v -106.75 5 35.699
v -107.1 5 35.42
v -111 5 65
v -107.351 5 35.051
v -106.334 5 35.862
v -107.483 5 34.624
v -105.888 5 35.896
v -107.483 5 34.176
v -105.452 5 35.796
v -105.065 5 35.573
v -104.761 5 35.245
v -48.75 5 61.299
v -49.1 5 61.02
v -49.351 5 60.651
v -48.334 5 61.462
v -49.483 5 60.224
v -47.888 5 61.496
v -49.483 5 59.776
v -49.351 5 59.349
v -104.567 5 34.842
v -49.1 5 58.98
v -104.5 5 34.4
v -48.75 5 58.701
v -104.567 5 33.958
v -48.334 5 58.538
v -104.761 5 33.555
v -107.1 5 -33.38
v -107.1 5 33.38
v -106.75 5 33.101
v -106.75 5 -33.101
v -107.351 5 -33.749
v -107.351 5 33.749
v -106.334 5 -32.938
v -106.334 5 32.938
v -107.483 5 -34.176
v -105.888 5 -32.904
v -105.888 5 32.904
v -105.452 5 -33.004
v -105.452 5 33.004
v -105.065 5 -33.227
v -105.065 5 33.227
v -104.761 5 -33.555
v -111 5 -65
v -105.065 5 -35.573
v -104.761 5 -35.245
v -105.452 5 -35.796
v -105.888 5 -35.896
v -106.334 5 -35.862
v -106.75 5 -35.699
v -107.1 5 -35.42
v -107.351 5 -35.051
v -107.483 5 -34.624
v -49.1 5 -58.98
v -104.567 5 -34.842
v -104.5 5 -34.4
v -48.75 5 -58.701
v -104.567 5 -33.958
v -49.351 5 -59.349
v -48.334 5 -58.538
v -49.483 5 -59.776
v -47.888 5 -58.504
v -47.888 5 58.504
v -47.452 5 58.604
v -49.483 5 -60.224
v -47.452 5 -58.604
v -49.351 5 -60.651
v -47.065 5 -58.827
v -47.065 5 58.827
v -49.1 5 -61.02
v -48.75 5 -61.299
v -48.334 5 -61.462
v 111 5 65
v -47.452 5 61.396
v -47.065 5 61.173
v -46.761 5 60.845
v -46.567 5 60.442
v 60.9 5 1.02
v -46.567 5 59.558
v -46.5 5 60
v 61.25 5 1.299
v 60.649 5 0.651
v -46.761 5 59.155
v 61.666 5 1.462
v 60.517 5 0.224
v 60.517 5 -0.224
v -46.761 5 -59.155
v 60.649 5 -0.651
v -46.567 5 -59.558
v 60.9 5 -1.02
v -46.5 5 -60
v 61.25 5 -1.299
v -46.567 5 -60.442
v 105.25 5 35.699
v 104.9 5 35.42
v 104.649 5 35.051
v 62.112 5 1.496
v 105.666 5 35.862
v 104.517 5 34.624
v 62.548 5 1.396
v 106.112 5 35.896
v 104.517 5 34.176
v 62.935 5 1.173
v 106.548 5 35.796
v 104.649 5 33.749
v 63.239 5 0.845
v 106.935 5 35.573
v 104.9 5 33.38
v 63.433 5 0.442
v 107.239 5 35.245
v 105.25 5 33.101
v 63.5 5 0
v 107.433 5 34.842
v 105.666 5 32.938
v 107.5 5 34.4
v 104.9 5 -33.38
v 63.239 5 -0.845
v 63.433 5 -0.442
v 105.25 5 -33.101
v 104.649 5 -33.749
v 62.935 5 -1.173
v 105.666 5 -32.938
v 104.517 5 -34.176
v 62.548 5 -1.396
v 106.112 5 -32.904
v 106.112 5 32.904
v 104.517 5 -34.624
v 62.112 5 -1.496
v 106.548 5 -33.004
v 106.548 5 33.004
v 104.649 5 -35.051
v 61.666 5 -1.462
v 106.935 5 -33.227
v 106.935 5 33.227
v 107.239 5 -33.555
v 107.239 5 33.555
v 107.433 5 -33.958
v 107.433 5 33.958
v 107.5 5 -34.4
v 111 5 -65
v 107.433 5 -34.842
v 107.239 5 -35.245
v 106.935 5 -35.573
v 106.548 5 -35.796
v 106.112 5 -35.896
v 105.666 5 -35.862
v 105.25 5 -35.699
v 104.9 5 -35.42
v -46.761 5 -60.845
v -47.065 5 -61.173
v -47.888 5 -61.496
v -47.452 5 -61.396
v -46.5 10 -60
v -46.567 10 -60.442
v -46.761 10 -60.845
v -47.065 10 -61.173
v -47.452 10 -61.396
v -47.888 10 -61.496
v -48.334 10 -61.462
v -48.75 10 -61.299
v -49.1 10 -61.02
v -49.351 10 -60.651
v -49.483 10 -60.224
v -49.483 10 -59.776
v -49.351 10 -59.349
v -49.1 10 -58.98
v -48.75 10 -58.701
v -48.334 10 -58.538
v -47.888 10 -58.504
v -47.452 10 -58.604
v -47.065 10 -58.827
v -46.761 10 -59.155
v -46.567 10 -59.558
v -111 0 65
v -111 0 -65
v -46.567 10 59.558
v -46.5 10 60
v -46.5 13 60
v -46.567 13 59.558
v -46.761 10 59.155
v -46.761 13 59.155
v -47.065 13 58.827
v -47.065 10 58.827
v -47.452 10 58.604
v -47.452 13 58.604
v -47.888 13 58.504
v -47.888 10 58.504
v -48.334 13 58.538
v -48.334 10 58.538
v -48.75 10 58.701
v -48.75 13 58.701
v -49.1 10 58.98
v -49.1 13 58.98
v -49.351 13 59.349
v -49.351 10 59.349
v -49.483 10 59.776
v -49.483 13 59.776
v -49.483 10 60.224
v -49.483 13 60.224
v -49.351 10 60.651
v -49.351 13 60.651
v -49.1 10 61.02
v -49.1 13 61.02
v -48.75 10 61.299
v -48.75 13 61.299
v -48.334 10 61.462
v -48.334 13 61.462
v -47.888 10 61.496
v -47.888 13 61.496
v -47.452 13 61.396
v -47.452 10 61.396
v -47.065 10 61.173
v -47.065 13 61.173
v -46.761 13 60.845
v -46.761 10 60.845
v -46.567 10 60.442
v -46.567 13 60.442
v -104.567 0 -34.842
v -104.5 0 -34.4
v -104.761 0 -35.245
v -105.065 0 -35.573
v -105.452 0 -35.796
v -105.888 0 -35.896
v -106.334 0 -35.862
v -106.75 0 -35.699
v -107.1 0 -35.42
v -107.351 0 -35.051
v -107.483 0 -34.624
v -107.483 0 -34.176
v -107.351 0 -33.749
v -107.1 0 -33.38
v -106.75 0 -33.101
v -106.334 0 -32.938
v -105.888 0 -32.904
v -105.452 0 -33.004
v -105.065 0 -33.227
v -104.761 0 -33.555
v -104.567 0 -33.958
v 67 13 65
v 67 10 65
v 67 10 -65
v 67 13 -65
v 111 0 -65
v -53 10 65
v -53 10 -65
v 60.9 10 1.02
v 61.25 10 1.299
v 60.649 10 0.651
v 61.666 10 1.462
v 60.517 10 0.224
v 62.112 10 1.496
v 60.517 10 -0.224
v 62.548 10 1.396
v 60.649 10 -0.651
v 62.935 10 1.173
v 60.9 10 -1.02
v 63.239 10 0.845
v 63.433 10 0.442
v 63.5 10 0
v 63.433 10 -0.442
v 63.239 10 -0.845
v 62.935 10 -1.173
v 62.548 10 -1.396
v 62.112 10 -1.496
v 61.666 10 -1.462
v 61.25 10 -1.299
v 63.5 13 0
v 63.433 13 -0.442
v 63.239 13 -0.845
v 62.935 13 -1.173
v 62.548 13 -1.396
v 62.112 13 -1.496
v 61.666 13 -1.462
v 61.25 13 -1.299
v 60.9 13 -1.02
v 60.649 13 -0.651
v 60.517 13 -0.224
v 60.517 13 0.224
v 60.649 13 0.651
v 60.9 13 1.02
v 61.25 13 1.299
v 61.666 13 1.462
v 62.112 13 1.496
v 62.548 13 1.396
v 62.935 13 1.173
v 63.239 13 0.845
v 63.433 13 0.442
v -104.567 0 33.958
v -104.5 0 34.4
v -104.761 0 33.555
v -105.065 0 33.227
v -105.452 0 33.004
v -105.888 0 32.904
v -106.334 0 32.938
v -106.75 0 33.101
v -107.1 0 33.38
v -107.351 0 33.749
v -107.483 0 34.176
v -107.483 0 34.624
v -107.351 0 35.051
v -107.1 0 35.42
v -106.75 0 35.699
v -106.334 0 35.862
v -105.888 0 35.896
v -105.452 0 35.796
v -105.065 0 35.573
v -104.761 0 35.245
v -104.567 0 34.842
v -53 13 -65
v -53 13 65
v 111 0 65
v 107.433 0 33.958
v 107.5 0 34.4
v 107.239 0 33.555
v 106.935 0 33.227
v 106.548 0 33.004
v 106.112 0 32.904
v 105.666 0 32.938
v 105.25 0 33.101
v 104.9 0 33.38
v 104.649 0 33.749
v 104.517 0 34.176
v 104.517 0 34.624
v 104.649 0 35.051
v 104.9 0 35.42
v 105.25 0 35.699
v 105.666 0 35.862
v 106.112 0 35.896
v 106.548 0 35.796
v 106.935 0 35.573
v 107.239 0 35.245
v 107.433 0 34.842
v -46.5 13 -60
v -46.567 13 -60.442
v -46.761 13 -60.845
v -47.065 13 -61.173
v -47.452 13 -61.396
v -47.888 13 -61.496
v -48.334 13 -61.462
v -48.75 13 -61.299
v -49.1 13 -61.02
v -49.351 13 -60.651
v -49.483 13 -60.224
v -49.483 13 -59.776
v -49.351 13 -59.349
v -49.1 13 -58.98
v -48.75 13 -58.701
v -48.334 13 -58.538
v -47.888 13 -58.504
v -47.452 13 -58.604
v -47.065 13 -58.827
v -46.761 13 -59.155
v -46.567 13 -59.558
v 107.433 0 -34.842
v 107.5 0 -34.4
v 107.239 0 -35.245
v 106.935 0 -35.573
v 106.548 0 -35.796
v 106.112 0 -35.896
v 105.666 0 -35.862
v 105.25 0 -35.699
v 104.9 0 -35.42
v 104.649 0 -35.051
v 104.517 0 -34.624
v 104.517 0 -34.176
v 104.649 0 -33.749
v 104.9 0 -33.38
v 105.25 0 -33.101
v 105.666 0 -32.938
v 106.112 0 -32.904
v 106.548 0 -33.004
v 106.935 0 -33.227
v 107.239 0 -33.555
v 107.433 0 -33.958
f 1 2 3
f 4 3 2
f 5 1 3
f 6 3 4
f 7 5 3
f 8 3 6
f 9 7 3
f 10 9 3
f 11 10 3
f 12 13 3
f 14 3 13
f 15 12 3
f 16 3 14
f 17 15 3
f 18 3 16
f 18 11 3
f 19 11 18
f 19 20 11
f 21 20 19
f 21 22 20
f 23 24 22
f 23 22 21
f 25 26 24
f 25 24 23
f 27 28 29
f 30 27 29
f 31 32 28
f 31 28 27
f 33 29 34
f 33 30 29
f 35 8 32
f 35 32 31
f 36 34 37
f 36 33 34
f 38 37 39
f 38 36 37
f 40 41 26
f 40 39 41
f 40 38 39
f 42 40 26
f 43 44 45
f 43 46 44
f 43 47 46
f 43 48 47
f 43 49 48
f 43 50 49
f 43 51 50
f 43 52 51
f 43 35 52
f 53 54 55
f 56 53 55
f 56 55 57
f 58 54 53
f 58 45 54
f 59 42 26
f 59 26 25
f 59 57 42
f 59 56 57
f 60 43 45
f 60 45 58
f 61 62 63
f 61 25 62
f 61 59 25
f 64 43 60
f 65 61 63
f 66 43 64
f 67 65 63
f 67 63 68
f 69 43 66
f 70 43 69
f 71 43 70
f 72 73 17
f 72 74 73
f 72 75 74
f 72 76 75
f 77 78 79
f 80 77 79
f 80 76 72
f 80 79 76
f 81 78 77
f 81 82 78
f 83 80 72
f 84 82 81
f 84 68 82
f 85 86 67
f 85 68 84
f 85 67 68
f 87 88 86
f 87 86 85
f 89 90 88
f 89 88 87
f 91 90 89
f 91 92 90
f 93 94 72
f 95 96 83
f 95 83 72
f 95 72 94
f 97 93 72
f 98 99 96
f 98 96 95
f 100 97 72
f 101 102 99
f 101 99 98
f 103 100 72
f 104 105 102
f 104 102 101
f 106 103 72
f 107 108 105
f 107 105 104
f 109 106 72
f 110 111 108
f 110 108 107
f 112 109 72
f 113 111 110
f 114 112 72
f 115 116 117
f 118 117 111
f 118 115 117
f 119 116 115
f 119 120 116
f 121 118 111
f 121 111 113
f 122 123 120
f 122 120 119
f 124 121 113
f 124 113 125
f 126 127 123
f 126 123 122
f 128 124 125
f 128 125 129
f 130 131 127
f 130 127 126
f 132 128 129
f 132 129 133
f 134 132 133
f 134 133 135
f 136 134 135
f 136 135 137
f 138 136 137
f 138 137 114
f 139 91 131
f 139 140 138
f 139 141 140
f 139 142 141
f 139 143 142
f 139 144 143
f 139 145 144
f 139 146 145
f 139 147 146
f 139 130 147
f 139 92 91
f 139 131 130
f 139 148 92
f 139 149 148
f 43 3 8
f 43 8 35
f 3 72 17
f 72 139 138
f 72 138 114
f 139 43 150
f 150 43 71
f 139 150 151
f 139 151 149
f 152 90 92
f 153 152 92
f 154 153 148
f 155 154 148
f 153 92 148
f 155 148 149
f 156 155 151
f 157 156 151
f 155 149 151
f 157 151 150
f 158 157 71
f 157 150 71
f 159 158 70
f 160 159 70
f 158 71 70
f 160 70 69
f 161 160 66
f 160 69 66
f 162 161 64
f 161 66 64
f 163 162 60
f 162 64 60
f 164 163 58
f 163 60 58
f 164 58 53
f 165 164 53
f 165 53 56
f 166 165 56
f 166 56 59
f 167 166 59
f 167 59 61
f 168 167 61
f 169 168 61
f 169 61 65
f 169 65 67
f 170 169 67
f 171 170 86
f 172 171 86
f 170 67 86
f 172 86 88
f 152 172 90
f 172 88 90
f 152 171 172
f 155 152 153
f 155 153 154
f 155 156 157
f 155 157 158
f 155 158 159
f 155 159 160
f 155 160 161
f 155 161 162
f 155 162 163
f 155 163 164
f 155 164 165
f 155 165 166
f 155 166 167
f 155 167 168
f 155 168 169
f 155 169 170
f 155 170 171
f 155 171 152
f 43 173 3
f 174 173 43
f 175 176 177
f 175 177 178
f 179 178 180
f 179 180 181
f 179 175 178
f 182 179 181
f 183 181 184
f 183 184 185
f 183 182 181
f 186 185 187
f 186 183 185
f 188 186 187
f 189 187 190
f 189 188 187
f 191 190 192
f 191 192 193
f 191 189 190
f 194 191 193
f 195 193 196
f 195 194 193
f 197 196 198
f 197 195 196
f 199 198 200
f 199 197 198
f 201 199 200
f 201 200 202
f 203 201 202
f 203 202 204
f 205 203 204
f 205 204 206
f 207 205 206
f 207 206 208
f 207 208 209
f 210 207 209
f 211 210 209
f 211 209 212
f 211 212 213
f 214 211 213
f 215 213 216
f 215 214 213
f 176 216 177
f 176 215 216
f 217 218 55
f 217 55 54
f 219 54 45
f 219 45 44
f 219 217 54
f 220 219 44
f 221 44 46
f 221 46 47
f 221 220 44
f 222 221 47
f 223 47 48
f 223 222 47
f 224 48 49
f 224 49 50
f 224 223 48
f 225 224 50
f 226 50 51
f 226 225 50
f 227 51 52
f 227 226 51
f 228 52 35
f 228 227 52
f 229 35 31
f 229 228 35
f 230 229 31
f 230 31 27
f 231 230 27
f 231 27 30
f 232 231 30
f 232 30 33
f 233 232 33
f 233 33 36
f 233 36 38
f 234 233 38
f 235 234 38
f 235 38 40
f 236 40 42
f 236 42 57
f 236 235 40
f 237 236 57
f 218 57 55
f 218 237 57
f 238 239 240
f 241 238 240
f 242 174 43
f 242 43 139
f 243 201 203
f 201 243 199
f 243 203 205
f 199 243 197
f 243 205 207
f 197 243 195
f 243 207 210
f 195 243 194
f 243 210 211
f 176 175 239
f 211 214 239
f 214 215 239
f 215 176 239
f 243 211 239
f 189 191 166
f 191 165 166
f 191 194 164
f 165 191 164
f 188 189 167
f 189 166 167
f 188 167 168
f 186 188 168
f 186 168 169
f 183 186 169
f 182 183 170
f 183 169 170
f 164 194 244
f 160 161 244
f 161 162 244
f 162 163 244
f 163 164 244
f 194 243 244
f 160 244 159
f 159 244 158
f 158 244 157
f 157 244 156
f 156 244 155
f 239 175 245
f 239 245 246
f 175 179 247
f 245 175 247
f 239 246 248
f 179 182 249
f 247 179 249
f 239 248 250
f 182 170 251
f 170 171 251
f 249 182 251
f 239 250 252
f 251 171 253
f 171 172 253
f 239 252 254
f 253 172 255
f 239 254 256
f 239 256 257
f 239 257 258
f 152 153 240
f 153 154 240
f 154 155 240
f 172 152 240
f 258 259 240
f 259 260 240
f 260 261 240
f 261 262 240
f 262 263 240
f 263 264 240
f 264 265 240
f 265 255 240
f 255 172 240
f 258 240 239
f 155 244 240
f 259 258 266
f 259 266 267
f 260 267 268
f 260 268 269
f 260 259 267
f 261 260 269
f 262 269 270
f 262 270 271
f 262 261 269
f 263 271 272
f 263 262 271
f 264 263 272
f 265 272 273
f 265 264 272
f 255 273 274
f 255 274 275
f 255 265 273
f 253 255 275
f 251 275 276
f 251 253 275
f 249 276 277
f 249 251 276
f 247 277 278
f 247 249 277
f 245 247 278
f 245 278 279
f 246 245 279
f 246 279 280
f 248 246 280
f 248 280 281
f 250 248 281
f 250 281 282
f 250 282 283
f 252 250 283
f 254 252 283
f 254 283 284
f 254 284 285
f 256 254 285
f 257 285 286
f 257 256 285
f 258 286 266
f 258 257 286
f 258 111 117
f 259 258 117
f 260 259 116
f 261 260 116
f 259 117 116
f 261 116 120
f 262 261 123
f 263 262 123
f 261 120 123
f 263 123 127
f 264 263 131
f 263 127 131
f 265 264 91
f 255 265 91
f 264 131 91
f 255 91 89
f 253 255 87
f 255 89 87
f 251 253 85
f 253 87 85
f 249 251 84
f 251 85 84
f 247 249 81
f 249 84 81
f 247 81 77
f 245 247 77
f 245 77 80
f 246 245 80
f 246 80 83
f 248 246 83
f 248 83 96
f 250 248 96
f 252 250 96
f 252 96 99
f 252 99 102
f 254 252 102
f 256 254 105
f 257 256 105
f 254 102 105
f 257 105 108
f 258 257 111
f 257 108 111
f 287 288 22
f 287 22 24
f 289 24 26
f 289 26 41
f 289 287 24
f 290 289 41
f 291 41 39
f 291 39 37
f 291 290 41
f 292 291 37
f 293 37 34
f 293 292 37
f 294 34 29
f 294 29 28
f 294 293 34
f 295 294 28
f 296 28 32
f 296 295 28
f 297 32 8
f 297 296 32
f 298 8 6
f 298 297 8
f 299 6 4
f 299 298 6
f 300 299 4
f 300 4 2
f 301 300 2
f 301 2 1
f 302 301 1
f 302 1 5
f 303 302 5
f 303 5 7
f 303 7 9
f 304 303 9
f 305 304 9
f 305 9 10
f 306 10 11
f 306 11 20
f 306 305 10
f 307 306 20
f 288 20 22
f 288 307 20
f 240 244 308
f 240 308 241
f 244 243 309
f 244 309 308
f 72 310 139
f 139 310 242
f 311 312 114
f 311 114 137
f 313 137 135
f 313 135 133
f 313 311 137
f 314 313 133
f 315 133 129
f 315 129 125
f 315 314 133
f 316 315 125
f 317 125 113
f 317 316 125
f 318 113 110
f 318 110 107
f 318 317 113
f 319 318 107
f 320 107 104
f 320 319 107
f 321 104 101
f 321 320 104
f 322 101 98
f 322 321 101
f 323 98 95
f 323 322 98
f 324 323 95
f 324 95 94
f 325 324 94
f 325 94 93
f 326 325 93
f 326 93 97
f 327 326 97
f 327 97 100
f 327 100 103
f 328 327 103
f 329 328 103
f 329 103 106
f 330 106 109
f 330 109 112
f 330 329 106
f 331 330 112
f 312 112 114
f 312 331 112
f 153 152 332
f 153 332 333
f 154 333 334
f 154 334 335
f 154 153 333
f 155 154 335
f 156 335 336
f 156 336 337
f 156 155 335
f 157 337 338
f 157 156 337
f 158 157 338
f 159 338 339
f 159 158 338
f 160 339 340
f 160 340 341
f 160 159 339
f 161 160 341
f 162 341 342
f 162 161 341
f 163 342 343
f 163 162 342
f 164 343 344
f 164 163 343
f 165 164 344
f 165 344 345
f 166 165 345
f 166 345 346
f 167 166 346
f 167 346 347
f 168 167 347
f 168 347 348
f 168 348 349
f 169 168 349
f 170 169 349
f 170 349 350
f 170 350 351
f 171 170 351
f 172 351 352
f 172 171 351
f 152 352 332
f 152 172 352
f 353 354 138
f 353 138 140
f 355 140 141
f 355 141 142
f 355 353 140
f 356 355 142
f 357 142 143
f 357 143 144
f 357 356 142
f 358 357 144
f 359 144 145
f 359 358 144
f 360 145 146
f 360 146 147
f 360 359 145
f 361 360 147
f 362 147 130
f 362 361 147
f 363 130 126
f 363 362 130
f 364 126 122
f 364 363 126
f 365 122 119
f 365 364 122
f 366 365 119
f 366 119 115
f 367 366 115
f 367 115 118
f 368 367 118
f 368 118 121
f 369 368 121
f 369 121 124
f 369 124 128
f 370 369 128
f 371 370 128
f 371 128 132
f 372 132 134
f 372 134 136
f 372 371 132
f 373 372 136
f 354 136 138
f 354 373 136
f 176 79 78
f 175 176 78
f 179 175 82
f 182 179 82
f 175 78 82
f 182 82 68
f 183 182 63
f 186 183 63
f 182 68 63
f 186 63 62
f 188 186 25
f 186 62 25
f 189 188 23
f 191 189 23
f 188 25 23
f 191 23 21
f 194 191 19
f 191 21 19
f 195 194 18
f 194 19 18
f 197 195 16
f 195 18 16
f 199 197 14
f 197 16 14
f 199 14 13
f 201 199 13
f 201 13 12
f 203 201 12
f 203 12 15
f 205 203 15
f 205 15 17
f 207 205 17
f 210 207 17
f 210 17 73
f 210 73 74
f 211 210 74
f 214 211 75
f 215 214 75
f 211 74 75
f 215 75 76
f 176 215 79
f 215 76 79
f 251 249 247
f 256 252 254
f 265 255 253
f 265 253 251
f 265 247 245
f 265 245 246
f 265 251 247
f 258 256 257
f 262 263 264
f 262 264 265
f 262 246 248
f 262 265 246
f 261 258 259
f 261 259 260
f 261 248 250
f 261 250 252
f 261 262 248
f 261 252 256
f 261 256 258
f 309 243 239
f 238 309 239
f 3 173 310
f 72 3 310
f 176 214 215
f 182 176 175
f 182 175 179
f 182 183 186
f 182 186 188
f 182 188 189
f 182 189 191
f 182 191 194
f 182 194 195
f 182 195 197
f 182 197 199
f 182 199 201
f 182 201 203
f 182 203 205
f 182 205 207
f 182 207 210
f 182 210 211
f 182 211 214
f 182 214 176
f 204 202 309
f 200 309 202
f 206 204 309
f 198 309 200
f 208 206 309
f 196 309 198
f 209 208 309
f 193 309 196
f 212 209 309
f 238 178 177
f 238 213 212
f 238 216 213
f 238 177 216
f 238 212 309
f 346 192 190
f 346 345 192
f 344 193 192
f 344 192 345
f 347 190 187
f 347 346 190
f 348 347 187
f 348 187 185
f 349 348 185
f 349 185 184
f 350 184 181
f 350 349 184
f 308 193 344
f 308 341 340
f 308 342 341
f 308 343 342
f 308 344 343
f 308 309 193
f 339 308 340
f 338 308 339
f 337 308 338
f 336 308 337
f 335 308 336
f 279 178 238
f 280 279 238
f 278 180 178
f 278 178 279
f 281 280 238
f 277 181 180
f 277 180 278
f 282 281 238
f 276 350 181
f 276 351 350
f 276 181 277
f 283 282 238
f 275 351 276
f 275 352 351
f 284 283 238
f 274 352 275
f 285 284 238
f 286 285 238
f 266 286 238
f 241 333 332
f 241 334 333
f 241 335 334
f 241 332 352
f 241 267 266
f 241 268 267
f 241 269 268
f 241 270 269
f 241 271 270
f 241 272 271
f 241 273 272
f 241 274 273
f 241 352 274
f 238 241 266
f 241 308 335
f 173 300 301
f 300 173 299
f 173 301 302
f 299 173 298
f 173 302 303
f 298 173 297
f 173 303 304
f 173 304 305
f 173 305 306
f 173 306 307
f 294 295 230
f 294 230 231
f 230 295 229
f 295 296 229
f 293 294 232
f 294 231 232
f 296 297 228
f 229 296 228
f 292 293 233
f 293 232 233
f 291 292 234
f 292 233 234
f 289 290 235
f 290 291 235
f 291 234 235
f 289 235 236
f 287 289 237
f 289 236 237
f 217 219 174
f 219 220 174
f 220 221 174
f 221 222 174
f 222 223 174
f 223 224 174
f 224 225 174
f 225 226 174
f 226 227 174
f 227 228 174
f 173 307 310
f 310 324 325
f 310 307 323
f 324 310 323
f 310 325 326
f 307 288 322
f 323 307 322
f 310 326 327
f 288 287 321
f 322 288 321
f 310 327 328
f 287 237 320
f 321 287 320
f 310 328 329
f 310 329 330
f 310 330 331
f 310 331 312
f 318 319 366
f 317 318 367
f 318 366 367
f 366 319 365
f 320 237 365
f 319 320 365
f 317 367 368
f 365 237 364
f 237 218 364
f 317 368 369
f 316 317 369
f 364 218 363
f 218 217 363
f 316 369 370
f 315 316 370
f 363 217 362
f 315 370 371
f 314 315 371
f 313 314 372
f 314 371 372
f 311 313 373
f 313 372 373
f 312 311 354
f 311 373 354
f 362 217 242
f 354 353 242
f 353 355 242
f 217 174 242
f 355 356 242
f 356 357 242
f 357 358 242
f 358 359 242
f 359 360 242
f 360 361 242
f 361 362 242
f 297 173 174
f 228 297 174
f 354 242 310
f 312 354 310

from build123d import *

# Parameters (mm, degrees)
ESBO_O1_W                = 222
ESBO_O1_H                = 130
ESBO_O1_R                = 1.5
RESSALTO_EXTRUS_O1_DEPTH = 5
ESBO_O2_R                = 1.5
RESSALTO_EXTRUS_O2_DEPTH = 5
RESSALTO_EXTRUS_O3_START = 5
ESBO_O2_3_W              = 120
ESBO_O2_3_H              = 130
ESBO_O2_3_R              = 1.5
RESSALTO_EXTRUS_O3_DEPTH = 3


with BuildPart() as part:
    # Esboço1 → Ressalto-extrusão1 (new body)
    with BuildSketch(Plane(origin=(0, 0, 0), x_dir=(1, 0, 0), z_dir=(0, 1, 0))):
        Rectangle(ESBO_O1_W, ESBO_O1_H)
        with Locations((-106, 34.4)):
            Circle(ESBO_O1_R, mode=Mode.SUBTRACT)
        with Locations((-106, -34.4)):
            Circle(ESBO_O1_R, mode=Mode.SUBTRACT)
        with Locations((106, 34.4)):
            Circle(ESBO_O1_R, mode=Mode.SUBTRACT)
        with Locations((106, -34.4)):
            Circle(ESBO_O1_R, mode=Mode.SUBTRACT)
    extrude(amount=RESSALTO_EXTRUS_O1_DEPTH)

    # Esboço2 → Ressalto-extrusão2 (add)
    with BuildSketch(Plane(origin=(0, 5, 0), x_dir=(1, 0, 0), z_dir=(0, 1, 0))):
        with Locations((-48, -60)):
            Circle(ESBO_O2_R)
        with Locations((62, 0)):
            Circle(ESBO_O2_R)
        with Locations((-48, 60)):
            Circle(ESBO_O2_R)
    extrude(amount=RESSALTO_EXTRUS_O2_DEPTH)


with BuildPart() as body_2:
    # Esboço2<3> → Ressalto-extrusão3 (new body)
    with BuildSketch(Plane(origin=(0, 5, 0), x_dir=(1, 0, 0), z_dir=(0, 1, 0)).offset(RESSALTO_EXTRUS_O3_START)):
        with Locations((7, 0)):
            Rectangle(ESBO_O2_3_W, ESBO_O2_3_H)
        with Locations((-48, -60)):
            Circle(ESBO_O2_3_R, mode=Mode.SUBTRACT)
        with Locations((62, 0)):
            Circle(ESBO_O2_3_R, mode=Mode.SUBTRACT)
        with Locations((-48, 60)):
            Circle(ESBO_O2_3_R, mode=Mode.SUBTRACT)
    extrude(amount=RESSALTO_EXTRUS_O3_DEPTH)


solid = Compound([part.part, body_2.part])
